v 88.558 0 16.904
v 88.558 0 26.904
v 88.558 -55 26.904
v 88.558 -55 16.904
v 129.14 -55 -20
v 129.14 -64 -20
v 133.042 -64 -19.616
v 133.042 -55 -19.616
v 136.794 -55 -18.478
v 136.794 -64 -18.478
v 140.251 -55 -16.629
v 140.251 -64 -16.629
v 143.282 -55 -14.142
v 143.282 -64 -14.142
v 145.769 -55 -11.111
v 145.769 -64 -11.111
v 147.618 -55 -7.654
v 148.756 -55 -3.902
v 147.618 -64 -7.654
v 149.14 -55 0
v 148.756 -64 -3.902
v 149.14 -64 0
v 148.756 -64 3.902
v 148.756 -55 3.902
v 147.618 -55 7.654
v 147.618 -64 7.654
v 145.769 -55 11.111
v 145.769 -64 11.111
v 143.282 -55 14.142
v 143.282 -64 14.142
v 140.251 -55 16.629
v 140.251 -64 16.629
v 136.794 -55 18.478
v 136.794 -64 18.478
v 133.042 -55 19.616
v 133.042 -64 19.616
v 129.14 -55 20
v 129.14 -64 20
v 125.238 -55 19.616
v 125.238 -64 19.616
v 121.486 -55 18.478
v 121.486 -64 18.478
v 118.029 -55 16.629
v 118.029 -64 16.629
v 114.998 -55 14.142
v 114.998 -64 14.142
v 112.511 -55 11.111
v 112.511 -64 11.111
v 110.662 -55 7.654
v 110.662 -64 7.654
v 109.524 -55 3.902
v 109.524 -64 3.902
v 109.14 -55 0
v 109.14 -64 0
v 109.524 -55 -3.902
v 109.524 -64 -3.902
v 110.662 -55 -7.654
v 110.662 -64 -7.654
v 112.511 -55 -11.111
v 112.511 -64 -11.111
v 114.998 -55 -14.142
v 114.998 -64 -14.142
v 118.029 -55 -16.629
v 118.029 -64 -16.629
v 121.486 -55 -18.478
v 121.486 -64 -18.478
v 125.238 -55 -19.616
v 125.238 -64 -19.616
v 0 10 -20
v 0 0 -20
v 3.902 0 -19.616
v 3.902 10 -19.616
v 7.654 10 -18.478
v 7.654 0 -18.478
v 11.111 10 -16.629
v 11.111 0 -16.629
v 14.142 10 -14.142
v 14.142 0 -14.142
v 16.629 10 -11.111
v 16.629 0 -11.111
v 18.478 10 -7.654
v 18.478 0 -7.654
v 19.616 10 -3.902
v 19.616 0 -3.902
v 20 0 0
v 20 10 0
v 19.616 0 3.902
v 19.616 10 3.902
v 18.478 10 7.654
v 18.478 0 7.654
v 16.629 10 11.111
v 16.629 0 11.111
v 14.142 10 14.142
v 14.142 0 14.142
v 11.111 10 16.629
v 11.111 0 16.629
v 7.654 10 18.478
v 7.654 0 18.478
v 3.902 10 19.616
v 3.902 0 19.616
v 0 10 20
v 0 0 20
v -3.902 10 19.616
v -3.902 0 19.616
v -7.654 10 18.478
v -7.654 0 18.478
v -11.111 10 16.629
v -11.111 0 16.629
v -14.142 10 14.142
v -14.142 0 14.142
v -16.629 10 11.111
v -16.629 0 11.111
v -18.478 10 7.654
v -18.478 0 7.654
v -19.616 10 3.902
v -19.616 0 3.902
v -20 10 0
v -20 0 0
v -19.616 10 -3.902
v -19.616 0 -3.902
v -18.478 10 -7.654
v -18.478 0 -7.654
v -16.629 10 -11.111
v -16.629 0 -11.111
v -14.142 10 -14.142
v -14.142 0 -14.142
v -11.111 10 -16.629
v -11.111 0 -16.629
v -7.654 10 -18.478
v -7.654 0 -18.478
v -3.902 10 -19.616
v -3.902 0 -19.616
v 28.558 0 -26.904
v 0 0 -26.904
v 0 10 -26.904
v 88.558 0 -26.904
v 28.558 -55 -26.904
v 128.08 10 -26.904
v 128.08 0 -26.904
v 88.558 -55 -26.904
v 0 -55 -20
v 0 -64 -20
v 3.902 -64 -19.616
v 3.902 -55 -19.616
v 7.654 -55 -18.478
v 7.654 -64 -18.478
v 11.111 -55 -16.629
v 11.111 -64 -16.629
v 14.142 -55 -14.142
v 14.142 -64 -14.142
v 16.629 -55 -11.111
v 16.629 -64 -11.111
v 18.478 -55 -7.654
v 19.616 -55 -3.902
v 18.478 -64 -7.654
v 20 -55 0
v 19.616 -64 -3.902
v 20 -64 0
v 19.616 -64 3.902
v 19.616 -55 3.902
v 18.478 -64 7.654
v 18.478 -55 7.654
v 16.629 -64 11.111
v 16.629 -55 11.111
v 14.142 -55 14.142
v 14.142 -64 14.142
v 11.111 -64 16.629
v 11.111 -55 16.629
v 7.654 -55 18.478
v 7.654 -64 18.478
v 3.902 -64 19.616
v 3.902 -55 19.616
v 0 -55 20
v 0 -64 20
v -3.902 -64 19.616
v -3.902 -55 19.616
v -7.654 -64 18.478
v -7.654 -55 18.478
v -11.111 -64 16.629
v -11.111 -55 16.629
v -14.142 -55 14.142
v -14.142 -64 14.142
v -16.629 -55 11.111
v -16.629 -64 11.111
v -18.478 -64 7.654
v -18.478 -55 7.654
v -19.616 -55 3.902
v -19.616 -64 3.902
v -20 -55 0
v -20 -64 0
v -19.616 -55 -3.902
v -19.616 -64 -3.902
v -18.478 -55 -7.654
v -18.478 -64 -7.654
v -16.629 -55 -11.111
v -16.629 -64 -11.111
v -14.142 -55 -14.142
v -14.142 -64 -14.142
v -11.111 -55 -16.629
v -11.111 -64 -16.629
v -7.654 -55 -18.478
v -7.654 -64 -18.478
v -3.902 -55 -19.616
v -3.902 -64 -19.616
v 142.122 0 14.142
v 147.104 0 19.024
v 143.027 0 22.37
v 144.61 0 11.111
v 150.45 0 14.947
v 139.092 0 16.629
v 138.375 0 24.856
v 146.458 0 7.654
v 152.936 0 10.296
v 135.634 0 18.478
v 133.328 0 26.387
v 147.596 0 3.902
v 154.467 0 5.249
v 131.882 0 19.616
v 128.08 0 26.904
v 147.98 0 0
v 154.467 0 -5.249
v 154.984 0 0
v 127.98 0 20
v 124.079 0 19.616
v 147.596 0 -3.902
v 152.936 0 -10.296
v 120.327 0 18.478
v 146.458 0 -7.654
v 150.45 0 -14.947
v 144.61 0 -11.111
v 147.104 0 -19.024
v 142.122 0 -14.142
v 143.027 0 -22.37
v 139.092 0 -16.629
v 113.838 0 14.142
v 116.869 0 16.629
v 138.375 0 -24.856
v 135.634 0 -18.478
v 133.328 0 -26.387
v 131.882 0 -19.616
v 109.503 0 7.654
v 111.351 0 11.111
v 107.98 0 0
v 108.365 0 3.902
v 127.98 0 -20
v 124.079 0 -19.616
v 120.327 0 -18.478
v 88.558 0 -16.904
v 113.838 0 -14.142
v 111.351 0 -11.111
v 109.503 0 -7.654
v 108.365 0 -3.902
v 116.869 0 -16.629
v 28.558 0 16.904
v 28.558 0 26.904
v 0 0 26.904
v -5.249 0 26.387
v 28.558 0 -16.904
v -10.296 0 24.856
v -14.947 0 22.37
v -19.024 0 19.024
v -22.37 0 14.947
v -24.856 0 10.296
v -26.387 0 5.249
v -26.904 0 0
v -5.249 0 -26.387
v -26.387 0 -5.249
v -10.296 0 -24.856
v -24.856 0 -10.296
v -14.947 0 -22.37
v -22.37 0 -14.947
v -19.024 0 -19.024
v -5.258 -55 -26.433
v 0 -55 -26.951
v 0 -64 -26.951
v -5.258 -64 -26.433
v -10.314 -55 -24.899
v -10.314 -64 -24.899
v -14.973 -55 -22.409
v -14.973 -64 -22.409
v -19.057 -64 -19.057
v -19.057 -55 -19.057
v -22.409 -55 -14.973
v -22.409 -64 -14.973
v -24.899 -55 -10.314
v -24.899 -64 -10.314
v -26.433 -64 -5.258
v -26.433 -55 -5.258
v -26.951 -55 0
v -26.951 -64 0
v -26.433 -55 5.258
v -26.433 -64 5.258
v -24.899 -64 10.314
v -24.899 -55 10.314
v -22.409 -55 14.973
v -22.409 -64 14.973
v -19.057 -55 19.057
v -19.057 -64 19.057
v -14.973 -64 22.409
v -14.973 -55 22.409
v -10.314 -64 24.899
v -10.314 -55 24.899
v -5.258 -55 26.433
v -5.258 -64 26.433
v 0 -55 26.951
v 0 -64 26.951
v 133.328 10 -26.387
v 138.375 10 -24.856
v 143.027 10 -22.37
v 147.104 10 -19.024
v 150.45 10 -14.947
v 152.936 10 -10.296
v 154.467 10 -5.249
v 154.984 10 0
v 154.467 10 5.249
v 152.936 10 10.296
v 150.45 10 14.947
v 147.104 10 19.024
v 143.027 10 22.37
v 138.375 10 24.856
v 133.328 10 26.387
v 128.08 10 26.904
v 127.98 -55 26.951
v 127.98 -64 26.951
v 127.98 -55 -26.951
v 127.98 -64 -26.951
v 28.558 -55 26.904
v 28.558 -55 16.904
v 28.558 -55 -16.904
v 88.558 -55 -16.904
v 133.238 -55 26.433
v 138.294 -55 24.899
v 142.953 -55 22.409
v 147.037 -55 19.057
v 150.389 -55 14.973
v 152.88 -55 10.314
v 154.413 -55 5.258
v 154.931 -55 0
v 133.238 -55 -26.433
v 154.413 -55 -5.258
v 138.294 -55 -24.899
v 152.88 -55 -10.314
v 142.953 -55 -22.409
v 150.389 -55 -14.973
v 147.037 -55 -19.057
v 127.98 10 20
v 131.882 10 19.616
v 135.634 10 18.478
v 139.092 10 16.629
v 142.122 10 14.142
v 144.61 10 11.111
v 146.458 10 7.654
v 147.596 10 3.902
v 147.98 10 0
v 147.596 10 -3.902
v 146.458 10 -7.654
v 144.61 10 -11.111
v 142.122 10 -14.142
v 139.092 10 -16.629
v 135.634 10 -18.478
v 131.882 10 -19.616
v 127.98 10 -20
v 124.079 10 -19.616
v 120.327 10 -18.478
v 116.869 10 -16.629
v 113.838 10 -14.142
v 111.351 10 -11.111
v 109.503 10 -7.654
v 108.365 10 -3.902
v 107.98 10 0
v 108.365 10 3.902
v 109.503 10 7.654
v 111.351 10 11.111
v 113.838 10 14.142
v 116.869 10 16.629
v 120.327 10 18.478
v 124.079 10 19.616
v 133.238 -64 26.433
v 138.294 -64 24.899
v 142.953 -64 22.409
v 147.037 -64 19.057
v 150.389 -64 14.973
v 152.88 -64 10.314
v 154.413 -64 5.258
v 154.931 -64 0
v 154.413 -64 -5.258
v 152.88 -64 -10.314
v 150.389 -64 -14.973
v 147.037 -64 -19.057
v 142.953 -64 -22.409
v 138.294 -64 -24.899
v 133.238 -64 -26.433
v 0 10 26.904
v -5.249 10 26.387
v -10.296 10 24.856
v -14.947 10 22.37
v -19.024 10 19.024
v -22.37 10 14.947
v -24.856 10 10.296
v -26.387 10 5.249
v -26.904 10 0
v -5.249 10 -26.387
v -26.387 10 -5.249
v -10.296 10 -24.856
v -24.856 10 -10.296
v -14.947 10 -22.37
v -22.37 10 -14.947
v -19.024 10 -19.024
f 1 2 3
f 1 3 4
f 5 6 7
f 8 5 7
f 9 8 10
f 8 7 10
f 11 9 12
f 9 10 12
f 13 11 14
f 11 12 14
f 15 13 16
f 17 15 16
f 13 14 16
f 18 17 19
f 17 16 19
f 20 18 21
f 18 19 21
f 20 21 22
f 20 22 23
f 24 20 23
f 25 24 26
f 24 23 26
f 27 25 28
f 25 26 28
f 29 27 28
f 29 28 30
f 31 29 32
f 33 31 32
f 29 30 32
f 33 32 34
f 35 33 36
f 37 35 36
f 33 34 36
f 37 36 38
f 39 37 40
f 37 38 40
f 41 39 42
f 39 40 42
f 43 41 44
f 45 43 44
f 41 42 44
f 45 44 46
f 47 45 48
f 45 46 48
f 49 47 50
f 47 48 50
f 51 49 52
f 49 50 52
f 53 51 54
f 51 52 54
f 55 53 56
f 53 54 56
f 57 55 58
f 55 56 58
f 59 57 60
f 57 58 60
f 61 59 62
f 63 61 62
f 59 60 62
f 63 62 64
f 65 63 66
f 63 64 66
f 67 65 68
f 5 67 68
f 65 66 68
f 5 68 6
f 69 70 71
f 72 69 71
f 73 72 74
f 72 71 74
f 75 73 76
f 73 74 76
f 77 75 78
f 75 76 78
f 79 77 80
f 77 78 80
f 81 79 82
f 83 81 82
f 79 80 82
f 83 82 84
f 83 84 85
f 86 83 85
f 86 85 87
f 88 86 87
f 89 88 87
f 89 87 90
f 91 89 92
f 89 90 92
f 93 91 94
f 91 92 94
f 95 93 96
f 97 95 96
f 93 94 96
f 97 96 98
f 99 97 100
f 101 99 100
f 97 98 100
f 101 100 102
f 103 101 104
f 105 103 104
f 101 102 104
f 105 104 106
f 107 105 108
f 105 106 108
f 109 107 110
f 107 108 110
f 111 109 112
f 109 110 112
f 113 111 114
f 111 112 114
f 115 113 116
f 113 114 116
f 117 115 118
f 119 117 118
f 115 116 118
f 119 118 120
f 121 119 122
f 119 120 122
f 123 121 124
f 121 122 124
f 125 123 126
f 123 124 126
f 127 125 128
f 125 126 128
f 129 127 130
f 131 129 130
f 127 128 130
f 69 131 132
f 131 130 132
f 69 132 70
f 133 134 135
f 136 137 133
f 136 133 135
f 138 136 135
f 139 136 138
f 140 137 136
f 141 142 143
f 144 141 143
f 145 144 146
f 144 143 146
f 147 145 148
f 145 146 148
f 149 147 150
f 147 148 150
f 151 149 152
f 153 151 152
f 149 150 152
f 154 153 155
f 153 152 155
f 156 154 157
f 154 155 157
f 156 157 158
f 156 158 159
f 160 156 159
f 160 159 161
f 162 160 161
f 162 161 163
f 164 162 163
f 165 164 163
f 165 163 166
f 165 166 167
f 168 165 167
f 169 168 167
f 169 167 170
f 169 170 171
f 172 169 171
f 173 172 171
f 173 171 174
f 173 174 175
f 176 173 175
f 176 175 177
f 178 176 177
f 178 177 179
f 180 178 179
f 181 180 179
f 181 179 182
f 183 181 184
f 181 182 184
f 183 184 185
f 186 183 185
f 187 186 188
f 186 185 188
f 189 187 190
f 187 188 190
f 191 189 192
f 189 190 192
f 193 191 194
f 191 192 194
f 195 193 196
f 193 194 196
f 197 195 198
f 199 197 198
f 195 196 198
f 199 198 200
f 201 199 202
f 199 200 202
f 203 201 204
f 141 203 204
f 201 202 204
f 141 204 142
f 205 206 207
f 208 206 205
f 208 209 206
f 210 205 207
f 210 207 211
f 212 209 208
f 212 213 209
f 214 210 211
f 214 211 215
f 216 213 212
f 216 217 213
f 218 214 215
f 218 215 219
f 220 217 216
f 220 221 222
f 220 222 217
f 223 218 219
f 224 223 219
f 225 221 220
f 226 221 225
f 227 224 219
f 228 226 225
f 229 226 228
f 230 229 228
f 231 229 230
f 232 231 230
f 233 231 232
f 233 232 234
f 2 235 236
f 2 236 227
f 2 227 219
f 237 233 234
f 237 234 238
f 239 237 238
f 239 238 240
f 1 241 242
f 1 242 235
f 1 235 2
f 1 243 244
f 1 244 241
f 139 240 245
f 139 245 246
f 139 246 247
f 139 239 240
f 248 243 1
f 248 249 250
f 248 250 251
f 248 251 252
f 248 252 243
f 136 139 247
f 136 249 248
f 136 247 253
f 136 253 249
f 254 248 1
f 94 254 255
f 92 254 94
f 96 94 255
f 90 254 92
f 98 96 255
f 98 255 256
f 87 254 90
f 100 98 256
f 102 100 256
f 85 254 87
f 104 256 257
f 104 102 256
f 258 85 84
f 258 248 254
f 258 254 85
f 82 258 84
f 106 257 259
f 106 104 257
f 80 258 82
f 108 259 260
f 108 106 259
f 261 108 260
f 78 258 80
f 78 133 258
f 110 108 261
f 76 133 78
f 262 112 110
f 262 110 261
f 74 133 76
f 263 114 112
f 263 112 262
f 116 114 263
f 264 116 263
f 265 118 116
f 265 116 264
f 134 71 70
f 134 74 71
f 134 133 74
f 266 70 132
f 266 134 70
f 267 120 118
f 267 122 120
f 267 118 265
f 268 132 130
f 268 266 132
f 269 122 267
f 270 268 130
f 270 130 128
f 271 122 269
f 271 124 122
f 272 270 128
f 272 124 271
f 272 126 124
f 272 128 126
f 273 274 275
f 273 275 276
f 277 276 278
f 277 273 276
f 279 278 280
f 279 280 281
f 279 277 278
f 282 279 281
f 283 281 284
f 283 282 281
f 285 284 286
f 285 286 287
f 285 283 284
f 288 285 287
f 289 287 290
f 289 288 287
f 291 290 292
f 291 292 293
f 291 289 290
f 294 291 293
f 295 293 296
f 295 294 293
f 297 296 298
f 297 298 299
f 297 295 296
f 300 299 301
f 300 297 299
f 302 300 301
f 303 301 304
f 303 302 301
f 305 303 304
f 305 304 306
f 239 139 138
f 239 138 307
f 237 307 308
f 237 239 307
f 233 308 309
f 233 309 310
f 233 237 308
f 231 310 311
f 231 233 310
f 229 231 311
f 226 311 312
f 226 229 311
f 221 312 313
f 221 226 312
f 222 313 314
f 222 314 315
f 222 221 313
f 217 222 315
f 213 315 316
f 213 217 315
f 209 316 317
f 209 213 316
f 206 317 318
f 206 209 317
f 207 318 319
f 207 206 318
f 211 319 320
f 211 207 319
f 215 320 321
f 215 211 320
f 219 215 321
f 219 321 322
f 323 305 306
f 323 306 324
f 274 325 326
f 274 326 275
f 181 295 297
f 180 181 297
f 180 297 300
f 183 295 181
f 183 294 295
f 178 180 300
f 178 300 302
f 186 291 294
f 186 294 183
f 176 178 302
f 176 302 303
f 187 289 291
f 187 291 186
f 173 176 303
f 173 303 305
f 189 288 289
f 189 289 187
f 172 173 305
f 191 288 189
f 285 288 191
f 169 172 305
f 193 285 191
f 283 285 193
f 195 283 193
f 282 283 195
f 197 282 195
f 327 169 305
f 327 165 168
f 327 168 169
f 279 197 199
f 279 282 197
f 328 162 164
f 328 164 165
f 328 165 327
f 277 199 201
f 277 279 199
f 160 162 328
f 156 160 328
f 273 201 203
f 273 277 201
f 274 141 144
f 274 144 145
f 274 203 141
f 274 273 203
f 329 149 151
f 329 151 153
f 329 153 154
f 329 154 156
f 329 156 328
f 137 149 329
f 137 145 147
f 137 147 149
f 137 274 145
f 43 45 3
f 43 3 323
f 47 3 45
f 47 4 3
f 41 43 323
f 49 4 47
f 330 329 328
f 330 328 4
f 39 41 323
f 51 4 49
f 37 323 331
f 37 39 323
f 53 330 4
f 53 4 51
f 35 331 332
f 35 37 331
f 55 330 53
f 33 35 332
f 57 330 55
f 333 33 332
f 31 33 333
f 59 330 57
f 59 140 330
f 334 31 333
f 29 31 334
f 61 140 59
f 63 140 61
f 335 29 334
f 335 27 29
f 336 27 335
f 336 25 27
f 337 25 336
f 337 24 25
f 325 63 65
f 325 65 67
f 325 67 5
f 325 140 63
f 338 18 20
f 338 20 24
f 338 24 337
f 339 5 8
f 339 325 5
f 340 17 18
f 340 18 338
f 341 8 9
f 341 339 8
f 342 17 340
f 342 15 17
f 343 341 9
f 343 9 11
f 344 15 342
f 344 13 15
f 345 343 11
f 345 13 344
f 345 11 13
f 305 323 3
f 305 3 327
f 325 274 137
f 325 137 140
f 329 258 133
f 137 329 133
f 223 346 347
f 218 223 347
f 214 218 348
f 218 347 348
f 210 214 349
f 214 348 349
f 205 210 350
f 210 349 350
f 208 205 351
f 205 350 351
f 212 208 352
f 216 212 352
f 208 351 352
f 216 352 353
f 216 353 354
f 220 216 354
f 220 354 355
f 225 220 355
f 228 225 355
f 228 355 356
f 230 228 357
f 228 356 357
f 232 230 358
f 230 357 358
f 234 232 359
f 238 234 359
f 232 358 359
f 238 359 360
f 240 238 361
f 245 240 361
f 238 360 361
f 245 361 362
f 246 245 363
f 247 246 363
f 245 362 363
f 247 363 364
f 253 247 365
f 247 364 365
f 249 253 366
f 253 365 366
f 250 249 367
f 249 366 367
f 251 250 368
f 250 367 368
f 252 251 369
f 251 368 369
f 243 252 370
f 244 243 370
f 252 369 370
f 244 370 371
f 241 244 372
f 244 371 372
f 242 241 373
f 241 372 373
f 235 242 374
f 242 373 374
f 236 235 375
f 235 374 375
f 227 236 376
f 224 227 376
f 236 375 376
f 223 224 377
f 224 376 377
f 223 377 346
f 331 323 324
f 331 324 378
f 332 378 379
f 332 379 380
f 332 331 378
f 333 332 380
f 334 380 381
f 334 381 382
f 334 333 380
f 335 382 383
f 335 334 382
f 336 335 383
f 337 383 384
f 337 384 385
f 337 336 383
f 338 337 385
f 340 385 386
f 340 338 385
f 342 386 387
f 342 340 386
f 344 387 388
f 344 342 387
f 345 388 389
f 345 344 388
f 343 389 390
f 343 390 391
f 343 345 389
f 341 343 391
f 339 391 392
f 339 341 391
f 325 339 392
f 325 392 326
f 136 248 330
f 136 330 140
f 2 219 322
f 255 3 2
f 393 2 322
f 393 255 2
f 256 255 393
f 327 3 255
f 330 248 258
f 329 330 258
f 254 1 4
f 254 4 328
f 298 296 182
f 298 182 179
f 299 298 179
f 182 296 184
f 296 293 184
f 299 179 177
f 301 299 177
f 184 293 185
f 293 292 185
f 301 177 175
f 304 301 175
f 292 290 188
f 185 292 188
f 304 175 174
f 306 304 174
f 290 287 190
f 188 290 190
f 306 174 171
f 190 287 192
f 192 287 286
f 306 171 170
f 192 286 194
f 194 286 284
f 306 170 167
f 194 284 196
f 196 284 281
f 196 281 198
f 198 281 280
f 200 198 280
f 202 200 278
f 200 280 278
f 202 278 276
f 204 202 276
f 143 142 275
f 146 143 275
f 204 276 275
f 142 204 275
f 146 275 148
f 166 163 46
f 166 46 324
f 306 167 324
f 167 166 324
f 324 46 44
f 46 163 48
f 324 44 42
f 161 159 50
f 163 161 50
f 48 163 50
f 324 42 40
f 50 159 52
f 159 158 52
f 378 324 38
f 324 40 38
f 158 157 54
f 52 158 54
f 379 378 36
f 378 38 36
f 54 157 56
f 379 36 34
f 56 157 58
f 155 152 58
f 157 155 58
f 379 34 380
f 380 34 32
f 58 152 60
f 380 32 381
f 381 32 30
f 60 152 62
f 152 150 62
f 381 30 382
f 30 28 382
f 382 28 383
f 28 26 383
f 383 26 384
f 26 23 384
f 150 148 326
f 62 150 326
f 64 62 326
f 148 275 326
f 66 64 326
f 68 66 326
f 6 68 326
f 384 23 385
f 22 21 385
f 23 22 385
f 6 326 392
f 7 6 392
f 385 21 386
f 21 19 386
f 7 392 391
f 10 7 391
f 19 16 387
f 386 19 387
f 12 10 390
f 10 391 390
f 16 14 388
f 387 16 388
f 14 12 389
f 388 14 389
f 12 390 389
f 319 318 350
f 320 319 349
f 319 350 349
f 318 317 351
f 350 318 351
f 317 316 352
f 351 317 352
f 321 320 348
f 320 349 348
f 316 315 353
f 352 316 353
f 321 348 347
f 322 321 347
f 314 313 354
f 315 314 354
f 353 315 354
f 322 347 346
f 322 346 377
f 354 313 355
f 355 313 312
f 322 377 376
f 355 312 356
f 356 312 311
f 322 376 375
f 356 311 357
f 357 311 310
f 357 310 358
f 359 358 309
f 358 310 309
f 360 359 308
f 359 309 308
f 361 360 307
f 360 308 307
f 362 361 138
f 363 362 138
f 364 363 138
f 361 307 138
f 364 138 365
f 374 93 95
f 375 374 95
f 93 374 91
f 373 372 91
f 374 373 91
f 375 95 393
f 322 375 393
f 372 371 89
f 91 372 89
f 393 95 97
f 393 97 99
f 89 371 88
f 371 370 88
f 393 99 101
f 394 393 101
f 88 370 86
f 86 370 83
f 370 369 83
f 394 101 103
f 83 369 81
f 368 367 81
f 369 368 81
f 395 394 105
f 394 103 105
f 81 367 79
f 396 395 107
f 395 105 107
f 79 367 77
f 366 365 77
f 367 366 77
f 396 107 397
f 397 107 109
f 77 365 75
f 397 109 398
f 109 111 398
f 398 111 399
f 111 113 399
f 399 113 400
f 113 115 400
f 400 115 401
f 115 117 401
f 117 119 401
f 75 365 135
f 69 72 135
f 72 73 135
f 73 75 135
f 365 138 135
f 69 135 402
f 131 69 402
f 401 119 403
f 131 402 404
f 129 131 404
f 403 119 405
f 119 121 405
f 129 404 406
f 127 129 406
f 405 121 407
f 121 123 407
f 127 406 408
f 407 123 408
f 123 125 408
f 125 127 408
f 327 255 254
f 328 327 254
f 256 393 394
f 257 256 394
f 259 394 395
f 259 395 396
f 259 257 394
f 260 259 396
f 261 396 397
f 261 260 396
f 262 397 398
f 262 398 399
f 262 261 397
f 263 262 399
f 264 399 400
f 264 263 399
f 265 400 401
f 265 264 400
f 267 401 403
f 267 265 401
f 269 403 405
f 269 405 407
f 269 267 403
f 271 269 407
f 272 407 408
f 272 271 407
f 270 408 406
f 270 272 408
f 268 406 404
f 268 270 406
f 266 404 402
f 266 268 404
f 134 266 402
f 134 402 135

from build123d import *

# Parameters (mm, degrees)
SALIENTE_EXTRUIR1_DEPTH = 10
CROQUIS2_R              = 20
CORTAR_EXTRUIR1_DEPTH   = 10
CROQUIS3_R              = 20
CORTAR_EXTRUIR2_DEPTH   = 10
CROQUIS5_W              = 60
CROQUIS5_H              = 10
SALIENTE_EXTRUIR3_DEPTH = 55
SALIENTE_EXTRUIR4_DEPTH = 9
CROQUIS8_R              = 20
CORTAR_EXTRUIR3_DEPTH   = 9
CROQUIS9_R              = 20
CORTAR_EXTRUIR4_DEPTH   = 10


with BuildPart() as part:
    # Croquis1 → Saliente-Extruir1 (new body)
    with BuildSketch(Plane(origin=(0, 0, 0), x_dir=(1, 0, 0), z_dir=(0, 1, 0))):
        with BuildLine():
            Line((0, 26.904276051), (128.079511341, 26.904276051))
            ThreePointArc((128.079511341, 26.904276051), (154.983787391, 0), (128.079511341, -26.904276051))
            Line((128.079511341, -26.904276051), (0, -26.904276051))
            ThreePointArc((0, -26.904276051), (-26.904276051, 0), (0, 26.904276051))
        make_face()
    extrude(amount=SALIENTE_EXTRUIR1_DEPTH)

    # Croquis2 → Cortar-Extruir1 (cut)
    with BuildSketch(Plane.XZ):
        with Locations(Location((0, 0, 0), (0, 0, 270))):
            Circle(CROQUIS2_R)
    extrude(amount=-CORTAR_EXTRUIR1_DEPTH, mode=Mode.SUBTRACT)

    # Croquis3 → Cortar-Extruir2 (cut)
    with BuildSketch(Plane(origin=(0, 10, 0), x_dir=(1, 0, 0), z_dir=(0, 1, 0))):
        with Locations(Location((127.980340476, 0, 0), (0, 0, 270))):
            Circle(CROQUIS3_R)
    extrude(amount=-CORTAR_EXTRUIR2_DEPTH, mode=Mode.SUBTRACT)

    # Croquis5 → Saliente-Extruir3 (add)
    with BuildSketch(Plane(origin=(0, 0, 0), x_dir=(-1, 0, 0), z_dir=(0, -1, 0))):
        with Locations((-58.558456053, -21.904276051)):
            Rectangle(CROQUIS5_W, CROQUIS5_H)
        with Locations((-58.558456053, 21.904276051)):
            Rectangle(CROQUIS5_W, CROQUIS5_H)
    extrude(amount=SALIENTE_EXTRUIR3_DEPTH)

    # Croquis7 → Saliente-Extruir4 (add)
    with BuildSketch(Plane(origin=(0, -55, 0), x_dir=(-1, 0, 0), z_dir=(0, -1, 0))):
        with BuildLine():
            Line((0, -26.950667307), (-127.980340476, -26.950667307))
            ThreePointArc((-127.980340476, -26.950667307), (-154.931007783, 0), (-127.980340476, 26.950667307))
            Line((-127.980340476, 26.950667307), (0, 26.950667307))
            ThreePointArc((0, 26.950667307), (26.950667307, 0), (0, -26.950667307))
        make_face()
    extrude(amount=SALIENTE_EXTRUIR4_DEPTH)

    # Croquis8 → Cortar-Extruir3 (cut)
    with BuildSketch(Plane(origin=(0, -64, 0), x_dir=(-1, 0, 0), z_dir=(0, -1, 0))):
        with Locations(Location((-129.139989333, 0, 0), (0, 0, 90))):
            Circle(CROQUIS8_R)
    extrude(amount=-CORTAR_EXTRUIR3_DEPTH, mode=Mode.SUBTRACT)

    # Croquis9 → Cortar-Extruir4 (cut)
    with BuildSketch(Plane(origin=(0, -64, 0), x_dir=(-1, 0, 0), z_dir=(0, -1, 0))):
        with Locations(Location((0, 0, 0), (0, 0, 90))):
            Circle(CROQUIS9_R)
    extrude(amount=-CORTAR_EXTRUIR4_DEPTH, mode=Mode.SUBTRACT)


solid = part.part
